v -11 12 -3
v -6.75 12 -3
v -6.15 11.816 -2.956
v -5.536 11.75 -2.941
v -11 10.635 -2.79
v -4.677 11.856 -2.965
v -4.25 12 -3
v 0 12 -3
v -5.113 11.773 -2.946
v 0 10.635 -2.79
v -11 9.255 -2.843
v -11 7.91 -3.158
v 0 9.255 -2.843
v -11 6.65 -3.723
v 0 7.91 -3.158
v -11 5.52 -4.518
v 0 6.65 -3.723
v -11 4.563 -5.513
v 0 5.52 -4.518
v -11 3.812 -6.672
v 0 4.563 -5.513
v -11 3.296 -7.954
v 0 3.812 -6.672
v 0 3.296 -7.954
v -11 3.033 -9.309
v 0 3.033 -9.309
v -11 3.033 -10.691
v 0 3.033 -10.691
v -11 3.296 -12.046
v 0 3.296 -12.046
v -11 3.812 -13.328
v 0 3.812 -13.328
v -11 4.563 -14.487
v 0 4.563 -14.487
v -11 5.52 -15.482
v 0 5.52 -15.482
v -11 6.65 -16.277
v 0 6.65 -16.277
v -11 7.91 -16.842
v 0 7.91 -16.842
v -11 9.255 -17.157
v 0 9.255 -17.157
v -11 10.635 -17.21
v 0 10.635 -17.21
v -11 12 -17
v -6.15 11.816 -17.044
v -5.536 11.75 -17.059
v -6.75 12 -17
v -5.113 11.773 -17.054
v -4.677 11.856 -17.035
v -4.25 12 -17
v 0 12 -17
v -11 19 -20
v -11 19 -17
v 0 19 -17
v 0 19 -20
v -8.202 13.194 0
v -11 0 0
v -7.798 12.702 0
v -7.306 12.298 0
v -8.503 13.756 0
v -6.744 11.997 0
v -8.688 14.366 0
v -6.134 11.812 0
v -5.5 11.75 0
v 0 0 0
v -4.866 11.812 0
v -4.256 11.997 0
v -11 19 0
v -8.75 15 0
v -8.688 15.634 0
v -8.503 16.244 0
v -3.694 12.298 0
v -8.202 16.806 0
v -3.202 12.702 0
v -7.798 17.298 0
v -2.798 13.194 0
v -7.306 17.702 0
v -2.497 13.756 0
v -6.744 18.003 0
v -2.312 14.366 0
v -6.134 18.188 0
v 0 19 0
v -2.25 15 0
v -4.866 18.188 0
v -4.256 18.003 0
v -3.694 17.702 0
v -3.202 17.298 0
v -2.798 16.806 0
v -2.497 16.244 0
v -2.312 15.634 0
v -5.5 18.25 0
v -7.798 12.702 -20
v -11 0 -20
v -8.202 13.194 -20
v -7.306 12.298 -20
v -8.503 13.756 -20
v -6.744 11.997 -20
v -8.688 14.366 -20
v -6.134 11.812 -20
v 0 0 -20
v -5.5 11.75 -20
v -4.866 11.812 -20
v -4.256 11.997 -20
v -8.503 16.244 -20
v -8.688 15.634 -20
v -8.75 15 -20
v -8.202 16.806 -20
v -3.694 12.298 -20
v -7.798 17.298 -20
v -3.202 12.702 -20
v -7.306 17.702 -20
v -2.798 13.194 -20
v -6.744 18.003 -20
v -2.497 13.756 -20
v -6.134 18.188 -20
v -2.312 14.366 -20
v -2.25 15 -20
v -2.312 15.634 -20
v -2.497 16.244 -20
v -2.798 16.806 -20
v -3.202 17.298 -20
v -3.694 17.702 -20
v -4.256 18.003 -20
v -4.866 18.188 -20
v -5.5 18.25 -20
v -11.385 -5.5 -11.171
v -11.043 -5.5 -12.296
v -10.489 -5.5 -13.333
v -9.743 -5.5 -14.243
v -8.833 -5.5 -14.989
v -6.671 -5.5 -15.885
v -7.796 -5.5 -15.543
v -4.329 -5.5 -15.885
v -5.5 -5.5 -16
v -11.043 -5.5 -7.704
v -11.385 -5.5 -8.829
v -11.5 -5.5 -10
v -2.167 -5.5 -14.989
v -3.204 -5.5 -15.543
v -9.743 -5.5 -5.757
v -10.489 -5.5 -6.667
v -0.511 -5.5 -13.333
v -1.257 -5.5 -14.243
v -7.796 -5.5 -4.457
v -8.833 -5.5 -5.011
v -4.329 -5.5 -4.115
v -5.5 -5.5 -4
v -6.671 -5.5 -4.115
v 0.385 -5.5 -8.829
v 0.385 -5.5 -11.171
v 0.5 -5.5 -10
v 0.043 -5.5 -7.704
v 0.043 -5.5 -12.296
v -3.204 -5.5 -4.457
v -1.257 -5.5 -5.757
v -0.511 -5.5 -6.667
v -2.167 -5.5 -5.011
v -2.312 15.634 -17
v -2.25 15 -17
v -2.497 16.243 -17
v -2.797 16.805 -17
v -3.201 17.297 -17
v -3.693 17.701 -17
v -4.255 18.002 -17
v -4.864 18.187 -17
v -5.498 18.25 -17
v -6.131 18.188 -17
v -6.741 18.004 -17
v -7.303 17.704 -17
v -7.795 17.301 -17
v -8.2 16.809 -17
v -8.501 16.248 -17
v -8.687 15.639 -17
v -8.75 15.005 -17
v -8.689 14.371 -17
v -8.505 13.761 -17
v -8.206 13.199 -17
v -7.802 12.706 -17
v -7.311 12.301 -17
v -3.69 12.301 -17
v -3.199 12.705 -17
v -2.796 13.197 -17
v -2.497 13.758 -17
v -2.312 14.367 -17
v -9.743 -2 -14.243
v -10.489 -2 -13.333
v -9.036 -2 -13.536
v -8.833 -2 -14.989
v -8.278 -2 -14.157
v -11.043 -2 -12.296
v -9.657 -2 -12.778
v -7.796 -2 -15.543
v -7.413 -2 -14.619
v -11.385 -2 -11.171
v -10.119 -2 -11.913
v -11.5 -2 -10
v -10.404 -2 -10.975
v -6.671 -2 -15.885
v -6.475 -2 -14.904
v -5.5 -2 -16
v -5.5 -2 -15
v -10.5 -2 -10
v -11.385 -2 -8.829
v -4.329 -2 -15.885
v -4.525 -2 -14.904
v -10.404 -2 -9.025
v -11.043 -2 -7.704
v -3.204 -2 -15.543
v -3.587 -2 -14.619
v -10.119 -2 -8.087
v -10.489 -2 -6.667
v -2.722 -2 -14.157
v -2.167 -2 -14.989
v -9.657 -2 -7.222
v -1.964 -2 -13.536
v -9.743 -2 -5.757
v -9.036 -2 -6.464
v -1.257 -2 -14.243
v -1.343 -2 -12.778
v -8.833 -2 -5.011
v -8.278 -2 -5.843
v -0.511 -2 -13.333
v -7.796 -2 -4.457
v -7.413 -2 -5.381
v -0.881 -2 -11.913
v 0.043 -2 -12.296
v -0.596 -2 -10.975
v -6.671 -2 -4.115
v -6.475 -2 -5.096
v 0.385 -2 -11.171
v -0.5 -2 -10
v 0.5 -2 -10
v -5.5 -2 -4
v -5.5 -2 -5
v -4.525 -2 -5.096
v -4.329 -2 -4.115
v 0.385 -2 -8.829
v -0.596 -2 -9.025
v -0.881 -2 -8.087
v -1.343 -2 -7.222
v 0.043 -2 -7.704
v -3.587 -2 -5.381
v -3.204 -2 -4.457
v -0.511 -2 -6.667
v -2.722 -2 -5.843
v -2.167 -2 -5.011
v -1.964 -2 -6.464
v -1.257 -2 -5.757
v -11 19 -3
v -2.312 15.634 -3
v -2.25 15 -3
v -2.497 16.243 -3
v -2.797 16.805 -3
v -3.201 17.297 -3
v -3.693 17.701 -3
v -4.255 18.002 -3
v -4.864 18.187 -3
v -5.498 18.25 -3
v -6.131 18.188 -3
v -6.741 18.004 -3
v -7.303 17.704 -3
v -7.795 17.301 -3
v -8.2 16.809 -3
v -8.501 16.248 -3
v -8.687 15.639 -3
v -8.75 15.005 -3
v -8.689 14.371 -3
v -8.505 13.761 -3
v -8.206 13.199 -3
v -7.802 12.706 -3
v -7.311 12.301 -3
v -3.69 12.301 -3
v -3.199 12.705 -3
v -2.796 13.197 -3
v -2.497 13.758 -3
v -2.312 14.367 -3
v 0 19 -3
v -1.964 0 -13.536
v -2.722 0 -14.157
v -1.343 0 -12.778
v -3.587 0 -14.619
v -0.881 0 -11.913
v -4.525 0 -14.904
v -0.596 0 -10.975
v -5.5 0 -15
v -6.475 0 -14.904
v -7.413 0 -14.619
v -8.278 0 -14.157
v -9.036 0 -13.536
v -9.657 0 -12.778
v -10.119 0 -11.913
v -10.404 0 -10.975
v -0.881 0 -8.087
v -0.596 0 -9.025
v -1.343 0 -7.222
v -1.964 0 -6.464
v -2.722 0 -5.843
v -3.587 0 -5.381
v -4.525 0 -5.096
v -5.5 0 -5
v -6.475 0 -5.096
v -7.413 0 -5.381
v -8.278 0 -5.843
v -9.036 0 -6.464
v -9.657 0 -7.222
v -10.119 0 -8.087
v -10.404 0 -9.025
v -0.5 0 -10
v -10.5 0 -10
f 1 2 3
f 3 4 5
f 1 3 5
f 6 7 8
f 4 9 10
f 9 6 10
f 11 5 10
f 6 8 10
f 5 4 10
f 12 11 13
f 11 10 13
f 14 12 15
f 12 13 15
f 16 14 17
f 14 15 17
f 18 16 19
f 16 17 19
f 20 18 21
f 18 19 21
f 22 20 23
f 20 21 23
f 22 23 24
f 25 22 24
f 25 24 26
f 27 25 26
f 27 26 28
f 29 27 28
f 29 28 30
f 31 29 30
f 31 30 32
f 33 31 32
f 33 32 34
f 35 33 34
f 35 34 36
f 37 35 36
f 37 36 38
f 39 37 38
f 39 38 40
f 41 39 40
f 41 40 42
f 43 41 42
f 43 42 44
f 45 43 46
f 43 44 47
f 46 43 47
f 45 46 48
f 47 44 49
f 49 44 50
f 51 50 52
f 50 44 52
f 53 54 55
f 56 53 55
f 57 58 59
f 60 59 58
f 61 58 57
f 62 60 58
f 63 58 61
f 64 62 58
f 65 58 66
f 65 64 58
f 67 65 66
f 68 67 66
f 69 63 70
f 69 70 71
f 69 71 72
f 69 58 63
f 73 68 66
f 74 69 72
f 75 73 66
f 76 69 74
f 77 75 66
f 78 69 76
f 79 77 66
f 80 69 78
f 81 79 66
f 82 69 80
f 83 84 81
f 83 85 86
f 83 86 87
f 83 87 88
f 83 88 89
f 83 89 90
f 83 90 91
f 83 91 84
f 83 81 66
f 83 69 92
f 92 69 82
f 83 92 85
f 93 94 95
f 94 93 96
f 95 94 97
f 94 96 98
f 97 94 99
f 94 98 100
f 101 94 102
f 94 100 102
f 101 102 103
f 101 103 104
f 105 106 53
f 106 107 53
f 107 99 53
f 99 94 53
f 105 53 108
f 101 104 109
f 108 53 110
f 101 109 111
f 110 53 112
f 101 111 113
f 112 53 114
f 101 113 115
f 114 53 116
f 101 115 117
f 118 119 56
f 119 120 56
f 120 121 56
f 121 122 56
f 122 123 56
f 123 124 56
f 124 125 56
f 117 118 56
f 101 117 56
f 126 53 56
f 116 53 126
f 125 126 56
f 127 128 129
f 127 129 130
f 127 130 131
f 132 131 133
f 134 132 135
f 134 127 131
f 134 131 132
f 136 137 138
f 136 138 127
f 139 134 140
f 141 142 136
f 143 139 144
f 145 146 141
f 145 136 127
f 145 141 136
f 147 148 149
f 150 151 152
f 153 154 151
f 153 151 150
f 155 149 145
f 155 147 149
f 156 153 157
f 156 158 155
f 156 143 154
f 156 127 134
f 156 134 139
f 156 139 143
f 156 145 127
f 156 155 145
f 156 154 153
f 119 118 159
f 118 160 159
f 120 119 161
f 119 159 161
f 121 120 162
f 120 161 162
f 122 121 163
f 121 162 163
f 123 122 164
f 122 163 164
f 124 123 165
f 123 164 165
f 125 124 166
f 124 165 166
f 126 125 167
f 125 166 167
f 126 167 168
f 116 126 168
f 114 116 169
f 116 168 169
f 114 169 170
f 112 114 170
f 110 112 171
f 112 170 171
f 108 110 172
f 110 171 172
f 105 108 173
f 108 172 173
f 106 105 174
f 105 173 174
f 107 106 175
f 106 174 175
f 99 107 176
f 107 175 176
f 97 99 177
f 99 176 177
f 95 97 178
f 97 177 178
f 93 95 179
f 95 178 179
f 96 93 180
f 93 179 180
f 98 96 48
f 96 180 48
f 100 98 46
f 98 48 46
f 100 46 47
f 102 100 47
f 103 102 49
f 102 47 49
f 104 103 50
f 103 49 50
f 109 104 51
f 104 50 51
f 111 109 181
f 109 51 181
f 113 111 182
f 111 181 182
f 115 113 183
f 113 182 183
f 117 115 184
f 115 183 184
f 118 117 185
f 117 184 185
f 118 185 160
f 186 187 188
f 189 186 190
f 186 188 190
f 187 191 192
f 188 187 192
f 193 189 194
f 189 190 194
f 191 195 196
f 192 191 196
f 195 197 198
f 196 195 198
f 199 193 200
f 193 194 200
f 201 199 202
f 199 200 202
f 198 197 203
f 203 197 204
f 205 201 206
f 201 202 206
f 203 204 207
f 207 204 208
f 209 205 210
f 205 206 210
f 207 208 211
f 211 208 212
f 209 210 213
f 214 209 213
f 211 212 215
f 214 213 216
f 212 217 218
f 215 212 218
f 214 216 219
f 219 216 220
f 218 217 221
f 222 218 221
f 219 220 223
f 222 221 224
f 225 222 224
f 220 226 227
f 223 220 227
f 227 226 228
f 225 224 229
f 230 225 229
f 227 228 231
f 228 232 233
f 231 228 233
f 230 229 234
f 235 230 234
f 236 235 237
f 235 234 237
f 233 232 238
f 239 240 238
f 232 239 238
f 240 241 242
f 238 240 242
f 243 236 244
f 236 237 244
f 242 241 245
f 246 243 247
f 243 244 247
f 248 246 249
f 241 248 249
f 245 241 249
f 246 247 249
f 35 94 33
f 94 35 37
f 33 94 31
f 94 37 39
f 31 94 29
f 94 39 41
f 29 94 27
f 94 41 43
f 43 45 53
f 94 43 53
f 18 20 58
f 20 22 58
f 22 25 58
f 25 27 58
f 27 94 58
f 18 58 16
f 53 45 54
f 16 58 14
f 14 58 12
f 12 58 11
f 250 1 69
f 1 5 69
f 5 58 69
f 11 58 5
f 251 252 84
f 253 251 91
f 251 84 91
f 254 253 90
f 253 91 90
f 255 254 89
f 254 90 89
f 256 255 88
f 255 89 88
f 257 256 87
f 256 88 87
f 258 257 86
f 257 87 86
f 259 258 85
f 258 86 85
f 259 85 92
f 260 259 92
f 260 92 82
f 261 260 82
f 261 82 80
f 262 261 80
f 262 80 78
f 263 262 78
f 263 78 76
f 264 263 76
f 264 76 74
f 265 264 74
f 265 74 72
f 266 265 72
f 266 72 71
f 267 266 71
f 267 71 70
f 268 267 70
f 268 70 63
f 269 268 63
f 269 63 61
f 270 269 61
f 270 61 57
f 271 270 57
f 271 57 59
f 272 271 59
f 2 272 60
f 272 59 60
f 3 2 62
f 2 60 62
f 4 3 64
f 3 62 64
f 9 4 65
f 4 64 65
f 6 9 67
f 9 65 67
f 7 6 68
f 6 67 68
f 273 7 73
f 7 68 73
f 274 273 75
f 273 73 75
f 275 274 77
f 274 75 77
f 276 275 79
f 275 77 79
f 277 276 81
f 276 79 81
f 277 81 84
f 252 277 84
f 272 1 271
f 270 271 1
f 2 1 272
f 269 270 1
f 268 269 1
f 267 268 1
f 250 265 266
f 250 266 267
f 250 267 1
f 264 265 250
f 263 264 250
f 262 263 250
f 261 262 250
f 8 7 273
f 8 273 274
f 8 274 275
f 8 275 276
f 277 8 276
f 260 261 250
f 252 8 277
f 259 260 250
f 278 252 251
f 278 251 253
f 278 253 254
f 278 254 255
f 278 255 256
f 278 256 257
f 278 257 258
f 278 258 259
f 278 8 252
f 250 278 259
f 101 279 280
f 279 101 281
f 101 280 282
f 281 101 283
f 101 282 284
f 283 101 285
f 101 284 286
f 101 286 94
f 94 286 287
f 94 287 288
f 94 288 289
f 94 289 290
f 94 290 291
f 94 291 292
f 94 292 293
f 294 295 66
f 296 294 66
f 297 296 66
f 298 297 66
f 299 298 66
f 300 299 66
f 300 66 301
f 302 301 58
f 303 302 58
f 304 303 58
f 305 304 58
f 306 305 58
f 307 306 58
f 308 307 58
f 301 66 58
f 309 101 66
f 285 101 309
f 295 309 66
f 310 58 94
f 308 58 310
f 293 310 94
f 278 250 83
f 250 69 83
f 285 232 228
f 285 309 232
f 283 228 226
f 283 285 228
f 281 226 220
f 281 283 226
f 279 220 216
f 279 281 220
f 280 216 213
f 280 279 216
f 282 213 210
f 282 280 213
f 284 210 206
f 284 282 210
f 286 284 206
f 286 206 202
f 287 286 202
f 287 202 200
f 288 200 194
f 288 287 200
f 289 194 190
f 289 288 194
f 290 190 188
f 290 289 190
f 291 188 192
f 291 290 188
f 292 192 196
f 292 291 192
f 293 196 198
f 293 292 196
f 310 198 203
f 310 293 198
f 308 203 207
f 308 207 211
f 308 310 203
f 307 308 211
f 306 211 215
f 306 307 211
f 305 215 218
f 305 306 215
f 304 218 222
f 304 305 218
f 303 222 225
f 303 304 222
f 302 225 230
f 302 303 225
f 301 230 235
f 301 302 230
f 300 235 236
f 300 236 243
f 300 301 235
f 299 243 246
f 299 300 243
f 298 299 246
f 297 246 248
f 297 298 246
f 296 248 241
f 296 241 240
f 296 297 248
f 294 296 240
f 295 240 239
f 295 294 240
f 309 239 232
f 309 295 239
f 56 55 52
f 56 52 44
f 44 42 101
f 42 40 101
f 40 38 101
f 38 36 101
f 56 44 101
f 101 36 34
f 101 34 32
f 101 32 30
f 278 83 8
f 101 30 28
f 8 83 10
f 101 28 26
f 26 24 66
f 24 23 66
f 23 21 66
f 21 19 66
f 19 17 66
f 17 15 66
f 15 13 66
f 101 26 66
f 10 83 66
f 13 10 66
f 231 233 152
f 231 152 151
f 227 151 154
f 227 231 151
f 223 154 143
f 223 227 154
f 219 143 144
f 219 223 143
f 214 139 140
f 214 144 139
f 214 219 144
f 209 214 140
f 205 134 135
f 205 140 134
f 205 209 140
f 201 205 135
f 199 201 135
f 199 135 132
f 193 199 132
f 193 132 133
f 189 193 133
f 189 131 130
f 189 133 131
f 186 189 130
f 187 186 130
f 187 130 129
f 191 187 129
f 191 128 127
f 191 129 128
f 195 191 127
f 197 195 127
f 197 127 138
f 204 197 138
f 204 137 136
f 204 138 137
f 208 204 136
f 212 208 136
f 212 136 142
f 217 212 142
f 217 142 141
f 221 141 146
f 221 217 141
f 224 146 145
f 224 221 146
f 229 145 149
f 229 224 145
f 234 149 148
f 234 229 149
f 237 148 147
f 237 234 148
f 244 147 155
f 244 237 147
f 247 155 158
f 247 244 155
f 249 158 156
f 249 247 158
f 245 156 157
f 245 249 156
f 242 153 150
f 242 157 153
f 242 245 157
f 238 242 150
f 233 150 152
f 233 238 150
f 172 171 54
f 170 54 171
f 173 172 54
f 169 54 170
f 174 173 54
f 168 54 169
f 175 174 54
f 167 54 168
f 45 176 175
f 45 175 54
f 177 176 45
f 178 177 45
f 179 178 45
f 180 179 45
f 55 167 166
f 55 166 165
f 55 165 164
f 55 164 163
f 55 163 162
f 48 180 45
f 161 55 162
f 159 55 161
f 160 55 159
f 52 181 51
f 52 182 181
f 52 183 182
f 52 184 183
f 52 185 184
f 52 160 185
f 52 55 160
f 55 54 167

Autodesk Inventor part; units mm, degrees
ref_plane "YZ Plane" through (0, 0, 0) normal (1, 0, 0) x (0, 1, 0)
ref_plane "XZ Plane" through (0, 0, 0) normal (0, 1, 0) x (-1, 0, 0)
ref_plane "XY Plane" through (0, 0, 0) normal (0, 0, 1) x (1, 0, 0)
sketch "Sketch2" plane through (0, 0, 0) normal (0, 1, 0) x (-1, 0, 0)
  line L0 (0, 0) -> (0, -20)
  line L1 (0, -20) -> (11, -20)
  line L2 (11, -20) -> (11, 0)
  line L3 (11, 0) -> (0, 0)
  dimension "d3" = 11
  dimension "d35" = 20
extrude "Extrusion1" add sketch "Sketch2" along normal blind 15
sketch "Sketch3" plane through (-11, 0, 0) normal (0, 0, 1) x (1, 0, 0)
  line L0 (0, 0) -> (11, 0) projected
  line L1 (11, 0) -> (11, 15) projected
  line L2 (0, 15) -> (11, 15) projected
  line L3 (0, 0) -> (0, 15) projected
  line L4 (11, 15) -> (0, 15) projected
  circle A0 centre (5.5, 15) radius 3.25
  line L5 (0, 15) -> (0, 19)
  line L6 (0, 19) -> (11, 19)
  line L7 (11, 19) -> (11, 15)
  point P0 (8.75, 15)
  point P1 (2.25, 15)
  dimension "d33" = 6.5
  dimension "d34" = 4
extrude "Extrusion2" cut sketch "Sketch3" against normal blind 32.25 contours L2 A0 picked at (4.4481, 14.7407)
sketch "Sketch4" plane through (0, 0, 0) normal (1, 0, 0) x (0, 0, -1)
  line L0 (0, 0) -> (20, 0) projected
  line L1 (20, 0) -> (20, 15) projected
  line L2 (0, 15) -> (20, 15) projected
  line L3 (0, 0) -> (0, 15) projected
  line L4 (0, 15) -> (3, 15)
  line L5 (0, 15) -> (20, 15) projected
  line L6 (20, 15) -> (17, 15)
  line L7 (17, 15) -> (17, 12)
  line L8 (0, 11.75) -> (20, 11.75) projected
  line L9 (17, 12) -> (3, 12)
  line L10 (3, 12) -> (3, 15)
  line L11 (20, 0) -> (0, 0) projected
  line L12 (10, 0) -> (10, 3)
  arc A0 (3, 12) -> (17, 12) centre (10, 10.2222) ccw
  line L13 (3, 15) -> (3, 23.7535)
  line L14 (3, 23.7535) -> (17, 23.7535)
  line L15 (17, 23.7535) -> (17, 15)
  point P0 (17, 15)
  dimension "d11" = 3
  dimension "d12" = 3
  dimension "d36" = 3
  dimension "d37" = 3
extrude "Extrusion3" cut sketch "Sketch4" against normal blind 32.25 contours A0 L8 | A0 L9 L8 | L2 L7 L9 L10
sketch "Sketch7" plane through (0, 0, 0) normal (0, -1, 0) x (1, 0, 0)
  line L0 (0, -20) -> (-11, -20) projected
  line L1 (0, 0) -> (0, -20) projected
  line L2 (-11, 0) -> (0, 0) projected
  line L3 (-11, -20) -> (-11, 0) projected
  circle A0 centre (-5.5, -10) radius 5
  line L4 (-11, -3) -> (-11, 0) projected
  line L5 (-11, 0) -> (-11, -10)
  line L6 (-11, -17.2222) -> (-11, -2.7778) projected
  line L7 (-11, -10) -> (0, -10)
  line L8 (0, -2.7778) -> (0, -17.2222) projected
  line L9 (-8.75, 0) -> (-2.25, 0) projected
  line L10 (-5.5, 0) -> (-5.5, -10)
  point P0 (-11, -17)
  point P1 (0, -17)
  point P2 (0, -3)
  dimension "d22" = 10
  dimension "d38" = 10
extrude "Extrusion6" add sketch "Sketch7" along normal blind 2 contours L7 L10 A0 | A0 L7 | A0 L10 L7
sketch "Sketch8" plane through (-5.5, -2, -10) normal (0, -1, 0) x (1, 0, 0)
  circle A0 centre (0, 0) radius 6
  point P0 (5.5, 10)
  dimension "d25" = 12
extrude "Extrusion7" add sketch "Sketch8" along normal blind 3.5
extrude "Extrusion8" add sketch "Sketch3" against normal blind 20 contours L5 L6 L7 L2 A0
extrude "Extrusion9" cut sketch "Sketch4" against normal blind 26 contours L13 L14 L15 L2
